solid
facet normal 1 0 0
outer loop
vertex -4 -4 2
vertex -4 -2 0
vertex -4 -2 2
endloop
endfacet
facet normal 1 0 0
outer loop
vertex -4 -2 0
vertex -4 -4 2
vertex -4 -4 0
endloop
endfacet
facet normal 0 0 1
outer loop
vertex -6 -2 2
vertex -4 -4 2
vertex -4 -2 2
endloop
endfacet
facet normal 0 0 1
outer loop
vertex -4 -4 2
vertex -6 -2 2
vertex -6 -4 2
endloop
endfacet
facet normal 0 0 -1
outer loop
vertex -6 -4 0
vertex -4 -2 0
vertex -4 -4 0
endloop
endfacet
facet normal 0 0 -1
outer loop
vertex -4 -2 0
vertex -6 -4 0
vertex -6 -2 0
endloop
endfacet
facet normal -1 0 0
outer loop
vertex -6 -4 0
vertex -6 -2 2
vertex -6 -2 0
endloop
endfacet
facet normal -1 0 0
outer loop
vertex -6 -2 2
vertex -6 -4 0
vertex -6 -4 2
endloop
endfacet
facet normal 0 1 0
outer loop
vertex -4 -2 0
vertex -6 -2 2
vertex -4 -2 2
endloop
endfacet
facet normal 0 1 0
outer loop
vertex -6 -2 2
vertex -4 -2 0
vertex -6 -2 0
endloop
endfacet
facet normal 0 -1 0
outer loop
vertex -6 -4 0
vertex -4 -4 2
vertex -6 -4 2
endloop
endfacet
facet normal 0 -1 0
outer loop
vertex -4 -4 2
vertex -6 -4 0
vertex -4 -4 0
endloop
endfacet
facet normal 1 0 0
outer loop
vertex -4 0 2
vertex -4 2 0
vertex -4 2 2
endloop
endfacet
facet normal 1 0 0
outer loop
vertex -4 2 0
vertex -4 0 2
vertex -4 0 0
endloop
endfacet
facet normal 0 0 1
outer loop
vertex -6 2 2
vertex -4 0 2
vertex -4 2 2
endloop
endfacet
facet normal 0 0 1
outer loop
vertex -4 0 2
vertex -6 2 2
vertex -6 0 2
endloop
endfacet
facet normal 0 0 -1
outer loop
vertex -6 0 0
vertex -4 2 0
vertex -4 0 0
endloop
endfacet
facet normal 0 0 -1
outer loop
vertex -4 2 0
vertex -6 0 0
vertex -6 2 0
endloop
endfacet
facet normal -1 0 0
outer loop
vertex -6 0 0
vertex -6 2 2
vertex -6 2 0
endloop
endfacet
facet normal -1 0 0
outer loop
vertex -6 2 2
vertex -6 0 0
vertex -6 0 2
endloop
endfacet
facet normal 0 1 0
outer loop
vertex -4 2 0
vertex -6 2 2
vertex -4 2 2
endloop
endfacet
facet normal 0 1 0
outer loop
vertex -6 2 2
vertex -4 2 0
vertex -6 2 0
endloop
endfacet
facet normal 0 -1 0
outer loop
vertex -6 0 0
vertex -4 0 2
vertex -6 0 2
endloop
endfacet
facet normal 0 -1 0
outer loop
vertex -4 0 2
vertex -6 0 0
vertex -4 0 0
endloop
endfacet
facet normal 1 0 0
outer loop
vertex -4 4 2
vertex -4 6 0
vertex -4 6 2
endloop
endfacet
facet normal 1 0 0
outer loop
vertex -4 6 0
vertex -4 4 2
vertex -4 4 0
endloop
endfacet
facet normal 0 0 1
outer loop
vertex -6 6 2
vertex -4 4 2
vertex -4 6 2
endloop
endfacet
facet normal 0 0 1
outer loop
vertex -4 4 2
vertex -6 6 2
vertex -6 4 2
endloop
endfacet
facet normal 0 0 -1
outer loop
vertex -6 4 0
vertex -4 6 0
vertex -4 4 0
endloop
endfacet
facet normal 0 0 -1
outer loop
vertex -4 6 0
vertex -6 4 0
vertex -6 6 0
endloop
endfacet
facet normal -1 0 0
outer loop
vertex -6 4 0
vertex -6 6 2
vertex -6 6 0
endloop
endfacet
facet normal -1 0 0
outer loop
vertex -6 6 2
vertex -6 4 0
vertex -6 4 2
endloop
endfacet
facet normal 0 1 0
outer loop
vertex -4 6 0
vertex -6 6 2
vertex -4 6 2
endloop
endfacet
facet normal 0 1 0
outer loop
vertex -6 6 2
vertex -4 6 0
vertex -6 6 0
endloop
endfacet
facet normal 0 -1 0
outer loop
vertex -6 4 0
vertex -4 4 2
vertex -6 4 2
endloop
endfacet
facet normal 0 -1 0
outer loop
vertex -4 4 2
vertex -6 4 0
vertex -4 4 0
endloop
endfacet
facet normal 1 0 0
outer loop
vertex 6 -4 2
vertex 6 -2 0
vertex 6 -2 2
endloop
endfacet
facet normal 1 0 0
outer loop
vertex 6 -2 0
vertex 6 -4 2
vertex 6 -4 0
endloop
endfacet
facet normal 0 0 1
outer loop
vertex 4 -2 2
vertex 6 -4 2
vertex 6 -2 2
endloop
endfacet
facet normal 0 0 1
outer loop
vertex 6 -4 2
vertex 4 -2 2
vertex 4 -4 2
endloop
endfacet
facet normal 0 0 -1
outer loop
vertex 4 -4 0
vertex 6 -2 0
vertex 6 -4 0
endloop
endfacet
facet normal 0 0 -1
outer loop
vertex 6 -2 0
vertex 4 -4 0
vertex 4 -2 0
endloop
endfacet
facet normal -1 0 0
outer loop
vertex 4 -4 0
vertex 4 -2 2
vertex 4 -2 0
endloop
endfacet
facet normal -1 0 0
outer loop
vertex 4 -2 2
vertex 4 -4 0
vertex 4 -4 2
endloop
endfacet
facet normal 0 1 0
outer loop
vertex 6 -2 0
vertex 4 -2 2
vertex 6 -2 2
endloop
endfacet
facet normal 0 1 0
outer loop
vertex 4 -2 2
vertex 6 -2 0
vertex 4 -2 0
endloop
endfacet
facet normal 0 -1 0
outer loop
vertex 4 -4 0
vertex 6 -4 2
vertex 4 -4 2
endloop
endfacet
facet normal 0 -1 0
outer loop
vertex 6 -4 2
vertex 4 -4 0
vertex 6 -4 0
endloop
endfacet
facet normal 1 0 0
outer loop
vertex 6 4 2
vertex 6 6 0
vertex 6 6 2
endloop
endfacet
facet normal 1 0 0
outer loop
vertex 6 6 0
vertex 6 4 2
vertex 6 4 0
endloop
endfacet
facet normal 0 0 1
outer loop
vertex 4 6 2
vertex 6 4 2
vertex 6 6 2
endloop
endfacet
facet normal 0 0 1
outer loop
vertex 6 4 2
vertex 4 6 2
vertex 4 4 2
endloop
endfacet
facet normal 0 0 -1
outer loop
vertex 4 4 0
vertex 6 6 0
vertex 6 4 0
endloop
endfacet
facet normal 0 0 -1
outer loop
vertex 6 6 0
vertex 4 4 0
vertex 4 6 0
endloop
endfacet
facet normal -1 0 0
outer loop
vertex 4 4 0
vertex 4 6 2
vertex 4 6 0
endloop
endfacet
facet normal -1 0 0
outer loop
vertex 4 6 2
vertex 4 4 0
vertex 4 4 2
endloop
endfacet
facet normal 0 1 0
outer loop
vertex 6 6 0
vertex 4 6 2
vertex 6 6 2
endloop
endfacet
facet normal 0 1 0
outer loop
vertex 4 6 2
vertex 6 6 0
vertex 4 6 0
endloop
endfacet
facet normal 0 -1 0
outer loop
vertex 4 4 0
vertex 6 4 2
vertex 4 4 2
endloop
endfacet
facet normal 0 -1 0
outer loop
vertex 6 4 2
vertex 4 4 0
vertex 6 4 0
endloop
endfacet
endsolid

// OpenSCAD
union() {
	translate([-6, -4, 0]) cube(size=[2,2,2], center=false);
	translate([-6, 0, 0]) cube(size=[2,2,2], center=false);
	translate([-6, 4, 0]) cube(size=[2,2,2], center=false);
	translate([4, -4, 0]) cube(size=[2,2,2], center=false);
	translate([4, 4, 0]) cube(size=[2,2,2], center=false);
}
